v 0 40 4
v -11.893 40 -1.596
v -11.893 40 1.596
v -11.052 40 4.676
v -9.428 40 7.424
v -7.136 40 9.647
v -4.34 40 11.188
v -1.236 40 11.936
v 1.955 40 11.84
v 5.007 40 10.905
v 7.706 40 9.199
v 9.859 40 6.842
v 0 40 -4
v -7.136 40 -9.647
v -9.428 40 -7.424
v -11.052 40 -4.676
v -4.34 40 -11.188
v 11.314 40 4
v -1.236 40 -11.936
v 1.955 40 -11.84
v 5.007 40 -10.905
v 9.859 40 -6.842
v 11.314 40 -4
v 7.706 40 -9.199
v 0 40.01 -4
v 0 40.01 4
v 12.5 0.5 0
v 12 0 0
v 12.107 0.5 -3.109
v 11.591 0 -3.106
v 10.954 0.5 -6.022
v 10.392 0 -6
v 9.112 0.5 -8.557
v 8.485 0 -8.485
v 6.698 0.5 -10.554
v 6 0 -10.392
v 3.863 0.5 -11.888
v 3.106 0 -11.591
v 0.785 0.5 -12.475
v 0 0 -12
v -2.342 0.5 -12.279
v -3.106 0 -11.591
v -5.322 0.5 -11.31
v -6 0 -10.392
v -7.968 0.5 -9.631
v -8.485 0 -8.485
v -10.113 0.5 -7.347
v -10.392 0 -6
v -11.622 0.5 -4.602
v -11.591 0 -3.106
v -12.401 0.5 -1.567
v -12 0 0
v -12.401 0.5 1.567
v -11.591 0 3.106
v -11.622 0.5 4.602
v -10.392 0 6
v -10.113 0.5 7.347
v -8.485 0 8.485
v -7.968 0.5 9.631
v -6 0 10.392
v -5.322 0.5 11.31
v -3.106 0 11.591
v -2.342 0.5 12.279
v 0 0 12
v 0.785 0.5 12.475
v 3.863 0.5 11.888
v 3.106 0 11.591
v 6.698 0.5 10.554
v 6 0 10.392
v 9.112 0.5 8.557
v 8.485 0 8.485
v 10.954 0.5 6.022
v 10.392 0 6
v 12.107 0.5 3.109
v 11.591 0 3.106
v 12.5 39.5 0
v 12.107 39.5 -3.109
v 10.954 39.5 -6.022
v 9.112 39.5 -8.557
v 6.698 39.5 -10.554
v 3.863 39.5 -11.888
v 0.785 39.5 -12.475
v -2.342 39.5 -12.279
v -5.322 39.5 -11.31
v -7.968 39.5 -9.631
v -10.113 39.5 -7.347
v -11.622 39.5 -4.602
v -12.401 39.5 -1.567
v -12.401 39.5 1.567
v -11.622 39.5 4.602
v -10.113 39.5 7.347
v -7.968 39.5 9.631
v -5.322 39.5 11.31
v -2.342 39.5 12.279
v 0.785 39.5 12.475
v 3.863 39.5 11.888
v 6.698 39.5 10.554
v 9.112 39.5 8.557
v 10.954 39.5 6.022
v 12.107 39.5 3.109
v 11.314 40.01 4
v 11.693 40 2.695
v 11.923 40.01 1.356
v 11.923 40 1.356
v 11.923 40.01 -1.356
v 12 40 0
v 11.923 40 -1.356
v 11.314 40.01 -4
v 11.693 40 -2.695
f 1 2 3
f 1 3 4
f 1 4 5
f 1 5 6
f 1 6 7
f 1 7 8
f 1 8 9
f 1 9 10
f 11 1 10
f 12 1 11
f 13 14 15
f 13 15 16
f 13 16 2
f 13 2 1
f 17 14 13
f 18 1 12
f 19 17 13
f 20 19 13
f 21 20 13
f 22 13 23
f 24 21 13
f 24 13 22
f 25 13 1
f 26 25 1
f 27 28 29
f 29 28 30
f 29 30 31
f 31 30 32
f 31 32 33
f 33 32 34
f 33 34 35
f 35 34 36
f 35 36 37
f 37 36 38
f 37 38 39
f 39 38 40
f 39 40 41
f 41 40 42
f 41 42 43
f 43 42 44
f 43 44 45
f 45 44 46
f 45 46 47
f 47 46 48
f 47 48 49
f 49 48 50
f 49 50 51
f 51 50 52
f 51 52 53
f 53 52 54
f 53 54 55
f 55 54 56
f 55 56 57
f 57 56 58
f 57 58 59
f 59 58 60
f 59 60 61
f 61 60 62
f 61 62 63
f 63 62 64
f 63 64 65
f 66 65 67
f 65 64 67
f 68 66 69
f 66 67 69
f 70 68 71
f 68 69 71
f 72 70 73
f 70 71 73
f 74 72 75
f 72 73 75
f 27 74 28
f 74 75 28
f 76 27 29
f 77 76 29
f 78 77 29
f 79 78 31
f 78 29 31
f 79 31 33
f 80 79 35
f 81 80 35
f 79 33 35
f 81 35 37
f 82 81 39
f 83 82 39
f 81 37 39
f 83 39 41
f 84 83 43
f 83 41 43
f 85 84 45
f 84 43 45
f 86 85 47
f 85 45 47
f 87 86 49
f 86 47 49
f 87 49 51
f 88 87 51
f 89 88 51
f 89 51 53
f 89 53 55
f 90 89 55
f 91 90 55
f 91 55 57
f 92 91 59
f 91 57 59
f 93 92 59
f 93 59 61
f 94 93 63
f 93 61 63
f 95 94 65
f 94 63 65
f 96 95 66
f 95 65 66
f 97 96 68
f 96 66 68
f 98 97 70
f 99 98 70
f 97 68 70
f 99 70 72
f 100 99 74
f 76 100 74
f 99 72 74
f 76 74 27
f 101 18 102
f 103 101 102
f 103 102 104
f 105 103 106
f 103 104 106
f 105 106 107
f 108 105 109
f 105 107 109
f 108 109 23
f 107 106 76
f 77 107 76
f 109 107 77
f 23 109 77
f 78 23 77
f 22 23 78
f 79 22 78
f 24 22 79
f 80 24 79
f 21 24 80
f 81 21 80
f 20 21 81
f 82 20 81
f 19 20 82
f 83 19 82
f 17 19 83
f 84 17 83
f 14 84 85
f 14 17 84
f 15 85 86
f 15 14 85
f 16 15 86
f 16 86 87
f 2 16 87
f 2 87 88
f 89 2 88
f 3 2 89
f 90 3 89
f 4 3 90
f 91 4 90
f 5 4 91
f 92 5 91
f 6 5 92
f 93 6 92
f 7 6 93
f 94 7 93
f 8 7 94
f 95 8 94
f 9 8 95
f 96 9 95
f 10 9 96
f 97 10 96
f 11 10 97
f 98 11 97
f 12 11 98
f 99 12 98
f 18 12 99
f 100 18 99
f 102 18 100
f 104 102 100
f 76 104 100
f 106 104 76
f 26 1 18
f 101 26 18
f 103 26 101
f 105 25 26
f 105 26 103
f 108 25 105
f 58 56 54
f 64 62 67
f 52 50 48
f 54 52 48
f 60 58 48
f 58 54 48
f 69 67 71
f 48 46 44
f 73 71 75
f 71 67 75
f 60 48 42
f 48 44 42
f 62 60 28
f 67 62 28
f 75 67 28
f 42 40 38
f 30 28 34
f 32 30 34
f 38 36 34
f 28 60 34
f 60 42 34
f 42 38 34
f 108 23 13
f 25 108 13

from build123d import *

# Parameters (mm, degrees)
SKETCH1_R           = 12.5
BOSS_EXTRUDE1_DEPTH = 40
CHAMFER1_SIZE       = 0.5
BOSS_EXTRUDE2_DEPTH = 0.01


with BuildPart() as part:
    # Sketch1 → Boss-Extrude1 (new body)
    with BuildSketch(Plane(origin=(0, 0, 0), x_dir=(1, 0, 0), z_dir=(0, 1, 0))):
        Circle(SKETCH1_R)
    extrude(amount=BOSS_EXTRUDE1_DEPTH)

    # Chamfer1
    chamfer1_edges = [part.edges().sort_by_distance(p)[0] for p in [
        (-12.5, 0, 0),
        (-12.5, 40, 0),
    ]]
    chamfer(chamfer1_edges, length=CHAMFER1_SIZE)

    # Sketch2 → Boss-Extrude2 (add)
    with BuildSketch(Plane(origin=(0, 40, 0), x_dir=(1, 0, 0), z_dir=(0, 1, 0))):
        with BuildLine():
            Line((11.313708499, 4), (0, 4))
            Line((0, 4), (0, -4))
            Line((0, -4), (11.313708499, -4))
            ThreePointArc((11.313708499, -4), (12, 0), (11.313708499, 4))
        make_face()
    extrude(amount=BOSS_EXTRUDE2_DEPTH)


solid = part.part
